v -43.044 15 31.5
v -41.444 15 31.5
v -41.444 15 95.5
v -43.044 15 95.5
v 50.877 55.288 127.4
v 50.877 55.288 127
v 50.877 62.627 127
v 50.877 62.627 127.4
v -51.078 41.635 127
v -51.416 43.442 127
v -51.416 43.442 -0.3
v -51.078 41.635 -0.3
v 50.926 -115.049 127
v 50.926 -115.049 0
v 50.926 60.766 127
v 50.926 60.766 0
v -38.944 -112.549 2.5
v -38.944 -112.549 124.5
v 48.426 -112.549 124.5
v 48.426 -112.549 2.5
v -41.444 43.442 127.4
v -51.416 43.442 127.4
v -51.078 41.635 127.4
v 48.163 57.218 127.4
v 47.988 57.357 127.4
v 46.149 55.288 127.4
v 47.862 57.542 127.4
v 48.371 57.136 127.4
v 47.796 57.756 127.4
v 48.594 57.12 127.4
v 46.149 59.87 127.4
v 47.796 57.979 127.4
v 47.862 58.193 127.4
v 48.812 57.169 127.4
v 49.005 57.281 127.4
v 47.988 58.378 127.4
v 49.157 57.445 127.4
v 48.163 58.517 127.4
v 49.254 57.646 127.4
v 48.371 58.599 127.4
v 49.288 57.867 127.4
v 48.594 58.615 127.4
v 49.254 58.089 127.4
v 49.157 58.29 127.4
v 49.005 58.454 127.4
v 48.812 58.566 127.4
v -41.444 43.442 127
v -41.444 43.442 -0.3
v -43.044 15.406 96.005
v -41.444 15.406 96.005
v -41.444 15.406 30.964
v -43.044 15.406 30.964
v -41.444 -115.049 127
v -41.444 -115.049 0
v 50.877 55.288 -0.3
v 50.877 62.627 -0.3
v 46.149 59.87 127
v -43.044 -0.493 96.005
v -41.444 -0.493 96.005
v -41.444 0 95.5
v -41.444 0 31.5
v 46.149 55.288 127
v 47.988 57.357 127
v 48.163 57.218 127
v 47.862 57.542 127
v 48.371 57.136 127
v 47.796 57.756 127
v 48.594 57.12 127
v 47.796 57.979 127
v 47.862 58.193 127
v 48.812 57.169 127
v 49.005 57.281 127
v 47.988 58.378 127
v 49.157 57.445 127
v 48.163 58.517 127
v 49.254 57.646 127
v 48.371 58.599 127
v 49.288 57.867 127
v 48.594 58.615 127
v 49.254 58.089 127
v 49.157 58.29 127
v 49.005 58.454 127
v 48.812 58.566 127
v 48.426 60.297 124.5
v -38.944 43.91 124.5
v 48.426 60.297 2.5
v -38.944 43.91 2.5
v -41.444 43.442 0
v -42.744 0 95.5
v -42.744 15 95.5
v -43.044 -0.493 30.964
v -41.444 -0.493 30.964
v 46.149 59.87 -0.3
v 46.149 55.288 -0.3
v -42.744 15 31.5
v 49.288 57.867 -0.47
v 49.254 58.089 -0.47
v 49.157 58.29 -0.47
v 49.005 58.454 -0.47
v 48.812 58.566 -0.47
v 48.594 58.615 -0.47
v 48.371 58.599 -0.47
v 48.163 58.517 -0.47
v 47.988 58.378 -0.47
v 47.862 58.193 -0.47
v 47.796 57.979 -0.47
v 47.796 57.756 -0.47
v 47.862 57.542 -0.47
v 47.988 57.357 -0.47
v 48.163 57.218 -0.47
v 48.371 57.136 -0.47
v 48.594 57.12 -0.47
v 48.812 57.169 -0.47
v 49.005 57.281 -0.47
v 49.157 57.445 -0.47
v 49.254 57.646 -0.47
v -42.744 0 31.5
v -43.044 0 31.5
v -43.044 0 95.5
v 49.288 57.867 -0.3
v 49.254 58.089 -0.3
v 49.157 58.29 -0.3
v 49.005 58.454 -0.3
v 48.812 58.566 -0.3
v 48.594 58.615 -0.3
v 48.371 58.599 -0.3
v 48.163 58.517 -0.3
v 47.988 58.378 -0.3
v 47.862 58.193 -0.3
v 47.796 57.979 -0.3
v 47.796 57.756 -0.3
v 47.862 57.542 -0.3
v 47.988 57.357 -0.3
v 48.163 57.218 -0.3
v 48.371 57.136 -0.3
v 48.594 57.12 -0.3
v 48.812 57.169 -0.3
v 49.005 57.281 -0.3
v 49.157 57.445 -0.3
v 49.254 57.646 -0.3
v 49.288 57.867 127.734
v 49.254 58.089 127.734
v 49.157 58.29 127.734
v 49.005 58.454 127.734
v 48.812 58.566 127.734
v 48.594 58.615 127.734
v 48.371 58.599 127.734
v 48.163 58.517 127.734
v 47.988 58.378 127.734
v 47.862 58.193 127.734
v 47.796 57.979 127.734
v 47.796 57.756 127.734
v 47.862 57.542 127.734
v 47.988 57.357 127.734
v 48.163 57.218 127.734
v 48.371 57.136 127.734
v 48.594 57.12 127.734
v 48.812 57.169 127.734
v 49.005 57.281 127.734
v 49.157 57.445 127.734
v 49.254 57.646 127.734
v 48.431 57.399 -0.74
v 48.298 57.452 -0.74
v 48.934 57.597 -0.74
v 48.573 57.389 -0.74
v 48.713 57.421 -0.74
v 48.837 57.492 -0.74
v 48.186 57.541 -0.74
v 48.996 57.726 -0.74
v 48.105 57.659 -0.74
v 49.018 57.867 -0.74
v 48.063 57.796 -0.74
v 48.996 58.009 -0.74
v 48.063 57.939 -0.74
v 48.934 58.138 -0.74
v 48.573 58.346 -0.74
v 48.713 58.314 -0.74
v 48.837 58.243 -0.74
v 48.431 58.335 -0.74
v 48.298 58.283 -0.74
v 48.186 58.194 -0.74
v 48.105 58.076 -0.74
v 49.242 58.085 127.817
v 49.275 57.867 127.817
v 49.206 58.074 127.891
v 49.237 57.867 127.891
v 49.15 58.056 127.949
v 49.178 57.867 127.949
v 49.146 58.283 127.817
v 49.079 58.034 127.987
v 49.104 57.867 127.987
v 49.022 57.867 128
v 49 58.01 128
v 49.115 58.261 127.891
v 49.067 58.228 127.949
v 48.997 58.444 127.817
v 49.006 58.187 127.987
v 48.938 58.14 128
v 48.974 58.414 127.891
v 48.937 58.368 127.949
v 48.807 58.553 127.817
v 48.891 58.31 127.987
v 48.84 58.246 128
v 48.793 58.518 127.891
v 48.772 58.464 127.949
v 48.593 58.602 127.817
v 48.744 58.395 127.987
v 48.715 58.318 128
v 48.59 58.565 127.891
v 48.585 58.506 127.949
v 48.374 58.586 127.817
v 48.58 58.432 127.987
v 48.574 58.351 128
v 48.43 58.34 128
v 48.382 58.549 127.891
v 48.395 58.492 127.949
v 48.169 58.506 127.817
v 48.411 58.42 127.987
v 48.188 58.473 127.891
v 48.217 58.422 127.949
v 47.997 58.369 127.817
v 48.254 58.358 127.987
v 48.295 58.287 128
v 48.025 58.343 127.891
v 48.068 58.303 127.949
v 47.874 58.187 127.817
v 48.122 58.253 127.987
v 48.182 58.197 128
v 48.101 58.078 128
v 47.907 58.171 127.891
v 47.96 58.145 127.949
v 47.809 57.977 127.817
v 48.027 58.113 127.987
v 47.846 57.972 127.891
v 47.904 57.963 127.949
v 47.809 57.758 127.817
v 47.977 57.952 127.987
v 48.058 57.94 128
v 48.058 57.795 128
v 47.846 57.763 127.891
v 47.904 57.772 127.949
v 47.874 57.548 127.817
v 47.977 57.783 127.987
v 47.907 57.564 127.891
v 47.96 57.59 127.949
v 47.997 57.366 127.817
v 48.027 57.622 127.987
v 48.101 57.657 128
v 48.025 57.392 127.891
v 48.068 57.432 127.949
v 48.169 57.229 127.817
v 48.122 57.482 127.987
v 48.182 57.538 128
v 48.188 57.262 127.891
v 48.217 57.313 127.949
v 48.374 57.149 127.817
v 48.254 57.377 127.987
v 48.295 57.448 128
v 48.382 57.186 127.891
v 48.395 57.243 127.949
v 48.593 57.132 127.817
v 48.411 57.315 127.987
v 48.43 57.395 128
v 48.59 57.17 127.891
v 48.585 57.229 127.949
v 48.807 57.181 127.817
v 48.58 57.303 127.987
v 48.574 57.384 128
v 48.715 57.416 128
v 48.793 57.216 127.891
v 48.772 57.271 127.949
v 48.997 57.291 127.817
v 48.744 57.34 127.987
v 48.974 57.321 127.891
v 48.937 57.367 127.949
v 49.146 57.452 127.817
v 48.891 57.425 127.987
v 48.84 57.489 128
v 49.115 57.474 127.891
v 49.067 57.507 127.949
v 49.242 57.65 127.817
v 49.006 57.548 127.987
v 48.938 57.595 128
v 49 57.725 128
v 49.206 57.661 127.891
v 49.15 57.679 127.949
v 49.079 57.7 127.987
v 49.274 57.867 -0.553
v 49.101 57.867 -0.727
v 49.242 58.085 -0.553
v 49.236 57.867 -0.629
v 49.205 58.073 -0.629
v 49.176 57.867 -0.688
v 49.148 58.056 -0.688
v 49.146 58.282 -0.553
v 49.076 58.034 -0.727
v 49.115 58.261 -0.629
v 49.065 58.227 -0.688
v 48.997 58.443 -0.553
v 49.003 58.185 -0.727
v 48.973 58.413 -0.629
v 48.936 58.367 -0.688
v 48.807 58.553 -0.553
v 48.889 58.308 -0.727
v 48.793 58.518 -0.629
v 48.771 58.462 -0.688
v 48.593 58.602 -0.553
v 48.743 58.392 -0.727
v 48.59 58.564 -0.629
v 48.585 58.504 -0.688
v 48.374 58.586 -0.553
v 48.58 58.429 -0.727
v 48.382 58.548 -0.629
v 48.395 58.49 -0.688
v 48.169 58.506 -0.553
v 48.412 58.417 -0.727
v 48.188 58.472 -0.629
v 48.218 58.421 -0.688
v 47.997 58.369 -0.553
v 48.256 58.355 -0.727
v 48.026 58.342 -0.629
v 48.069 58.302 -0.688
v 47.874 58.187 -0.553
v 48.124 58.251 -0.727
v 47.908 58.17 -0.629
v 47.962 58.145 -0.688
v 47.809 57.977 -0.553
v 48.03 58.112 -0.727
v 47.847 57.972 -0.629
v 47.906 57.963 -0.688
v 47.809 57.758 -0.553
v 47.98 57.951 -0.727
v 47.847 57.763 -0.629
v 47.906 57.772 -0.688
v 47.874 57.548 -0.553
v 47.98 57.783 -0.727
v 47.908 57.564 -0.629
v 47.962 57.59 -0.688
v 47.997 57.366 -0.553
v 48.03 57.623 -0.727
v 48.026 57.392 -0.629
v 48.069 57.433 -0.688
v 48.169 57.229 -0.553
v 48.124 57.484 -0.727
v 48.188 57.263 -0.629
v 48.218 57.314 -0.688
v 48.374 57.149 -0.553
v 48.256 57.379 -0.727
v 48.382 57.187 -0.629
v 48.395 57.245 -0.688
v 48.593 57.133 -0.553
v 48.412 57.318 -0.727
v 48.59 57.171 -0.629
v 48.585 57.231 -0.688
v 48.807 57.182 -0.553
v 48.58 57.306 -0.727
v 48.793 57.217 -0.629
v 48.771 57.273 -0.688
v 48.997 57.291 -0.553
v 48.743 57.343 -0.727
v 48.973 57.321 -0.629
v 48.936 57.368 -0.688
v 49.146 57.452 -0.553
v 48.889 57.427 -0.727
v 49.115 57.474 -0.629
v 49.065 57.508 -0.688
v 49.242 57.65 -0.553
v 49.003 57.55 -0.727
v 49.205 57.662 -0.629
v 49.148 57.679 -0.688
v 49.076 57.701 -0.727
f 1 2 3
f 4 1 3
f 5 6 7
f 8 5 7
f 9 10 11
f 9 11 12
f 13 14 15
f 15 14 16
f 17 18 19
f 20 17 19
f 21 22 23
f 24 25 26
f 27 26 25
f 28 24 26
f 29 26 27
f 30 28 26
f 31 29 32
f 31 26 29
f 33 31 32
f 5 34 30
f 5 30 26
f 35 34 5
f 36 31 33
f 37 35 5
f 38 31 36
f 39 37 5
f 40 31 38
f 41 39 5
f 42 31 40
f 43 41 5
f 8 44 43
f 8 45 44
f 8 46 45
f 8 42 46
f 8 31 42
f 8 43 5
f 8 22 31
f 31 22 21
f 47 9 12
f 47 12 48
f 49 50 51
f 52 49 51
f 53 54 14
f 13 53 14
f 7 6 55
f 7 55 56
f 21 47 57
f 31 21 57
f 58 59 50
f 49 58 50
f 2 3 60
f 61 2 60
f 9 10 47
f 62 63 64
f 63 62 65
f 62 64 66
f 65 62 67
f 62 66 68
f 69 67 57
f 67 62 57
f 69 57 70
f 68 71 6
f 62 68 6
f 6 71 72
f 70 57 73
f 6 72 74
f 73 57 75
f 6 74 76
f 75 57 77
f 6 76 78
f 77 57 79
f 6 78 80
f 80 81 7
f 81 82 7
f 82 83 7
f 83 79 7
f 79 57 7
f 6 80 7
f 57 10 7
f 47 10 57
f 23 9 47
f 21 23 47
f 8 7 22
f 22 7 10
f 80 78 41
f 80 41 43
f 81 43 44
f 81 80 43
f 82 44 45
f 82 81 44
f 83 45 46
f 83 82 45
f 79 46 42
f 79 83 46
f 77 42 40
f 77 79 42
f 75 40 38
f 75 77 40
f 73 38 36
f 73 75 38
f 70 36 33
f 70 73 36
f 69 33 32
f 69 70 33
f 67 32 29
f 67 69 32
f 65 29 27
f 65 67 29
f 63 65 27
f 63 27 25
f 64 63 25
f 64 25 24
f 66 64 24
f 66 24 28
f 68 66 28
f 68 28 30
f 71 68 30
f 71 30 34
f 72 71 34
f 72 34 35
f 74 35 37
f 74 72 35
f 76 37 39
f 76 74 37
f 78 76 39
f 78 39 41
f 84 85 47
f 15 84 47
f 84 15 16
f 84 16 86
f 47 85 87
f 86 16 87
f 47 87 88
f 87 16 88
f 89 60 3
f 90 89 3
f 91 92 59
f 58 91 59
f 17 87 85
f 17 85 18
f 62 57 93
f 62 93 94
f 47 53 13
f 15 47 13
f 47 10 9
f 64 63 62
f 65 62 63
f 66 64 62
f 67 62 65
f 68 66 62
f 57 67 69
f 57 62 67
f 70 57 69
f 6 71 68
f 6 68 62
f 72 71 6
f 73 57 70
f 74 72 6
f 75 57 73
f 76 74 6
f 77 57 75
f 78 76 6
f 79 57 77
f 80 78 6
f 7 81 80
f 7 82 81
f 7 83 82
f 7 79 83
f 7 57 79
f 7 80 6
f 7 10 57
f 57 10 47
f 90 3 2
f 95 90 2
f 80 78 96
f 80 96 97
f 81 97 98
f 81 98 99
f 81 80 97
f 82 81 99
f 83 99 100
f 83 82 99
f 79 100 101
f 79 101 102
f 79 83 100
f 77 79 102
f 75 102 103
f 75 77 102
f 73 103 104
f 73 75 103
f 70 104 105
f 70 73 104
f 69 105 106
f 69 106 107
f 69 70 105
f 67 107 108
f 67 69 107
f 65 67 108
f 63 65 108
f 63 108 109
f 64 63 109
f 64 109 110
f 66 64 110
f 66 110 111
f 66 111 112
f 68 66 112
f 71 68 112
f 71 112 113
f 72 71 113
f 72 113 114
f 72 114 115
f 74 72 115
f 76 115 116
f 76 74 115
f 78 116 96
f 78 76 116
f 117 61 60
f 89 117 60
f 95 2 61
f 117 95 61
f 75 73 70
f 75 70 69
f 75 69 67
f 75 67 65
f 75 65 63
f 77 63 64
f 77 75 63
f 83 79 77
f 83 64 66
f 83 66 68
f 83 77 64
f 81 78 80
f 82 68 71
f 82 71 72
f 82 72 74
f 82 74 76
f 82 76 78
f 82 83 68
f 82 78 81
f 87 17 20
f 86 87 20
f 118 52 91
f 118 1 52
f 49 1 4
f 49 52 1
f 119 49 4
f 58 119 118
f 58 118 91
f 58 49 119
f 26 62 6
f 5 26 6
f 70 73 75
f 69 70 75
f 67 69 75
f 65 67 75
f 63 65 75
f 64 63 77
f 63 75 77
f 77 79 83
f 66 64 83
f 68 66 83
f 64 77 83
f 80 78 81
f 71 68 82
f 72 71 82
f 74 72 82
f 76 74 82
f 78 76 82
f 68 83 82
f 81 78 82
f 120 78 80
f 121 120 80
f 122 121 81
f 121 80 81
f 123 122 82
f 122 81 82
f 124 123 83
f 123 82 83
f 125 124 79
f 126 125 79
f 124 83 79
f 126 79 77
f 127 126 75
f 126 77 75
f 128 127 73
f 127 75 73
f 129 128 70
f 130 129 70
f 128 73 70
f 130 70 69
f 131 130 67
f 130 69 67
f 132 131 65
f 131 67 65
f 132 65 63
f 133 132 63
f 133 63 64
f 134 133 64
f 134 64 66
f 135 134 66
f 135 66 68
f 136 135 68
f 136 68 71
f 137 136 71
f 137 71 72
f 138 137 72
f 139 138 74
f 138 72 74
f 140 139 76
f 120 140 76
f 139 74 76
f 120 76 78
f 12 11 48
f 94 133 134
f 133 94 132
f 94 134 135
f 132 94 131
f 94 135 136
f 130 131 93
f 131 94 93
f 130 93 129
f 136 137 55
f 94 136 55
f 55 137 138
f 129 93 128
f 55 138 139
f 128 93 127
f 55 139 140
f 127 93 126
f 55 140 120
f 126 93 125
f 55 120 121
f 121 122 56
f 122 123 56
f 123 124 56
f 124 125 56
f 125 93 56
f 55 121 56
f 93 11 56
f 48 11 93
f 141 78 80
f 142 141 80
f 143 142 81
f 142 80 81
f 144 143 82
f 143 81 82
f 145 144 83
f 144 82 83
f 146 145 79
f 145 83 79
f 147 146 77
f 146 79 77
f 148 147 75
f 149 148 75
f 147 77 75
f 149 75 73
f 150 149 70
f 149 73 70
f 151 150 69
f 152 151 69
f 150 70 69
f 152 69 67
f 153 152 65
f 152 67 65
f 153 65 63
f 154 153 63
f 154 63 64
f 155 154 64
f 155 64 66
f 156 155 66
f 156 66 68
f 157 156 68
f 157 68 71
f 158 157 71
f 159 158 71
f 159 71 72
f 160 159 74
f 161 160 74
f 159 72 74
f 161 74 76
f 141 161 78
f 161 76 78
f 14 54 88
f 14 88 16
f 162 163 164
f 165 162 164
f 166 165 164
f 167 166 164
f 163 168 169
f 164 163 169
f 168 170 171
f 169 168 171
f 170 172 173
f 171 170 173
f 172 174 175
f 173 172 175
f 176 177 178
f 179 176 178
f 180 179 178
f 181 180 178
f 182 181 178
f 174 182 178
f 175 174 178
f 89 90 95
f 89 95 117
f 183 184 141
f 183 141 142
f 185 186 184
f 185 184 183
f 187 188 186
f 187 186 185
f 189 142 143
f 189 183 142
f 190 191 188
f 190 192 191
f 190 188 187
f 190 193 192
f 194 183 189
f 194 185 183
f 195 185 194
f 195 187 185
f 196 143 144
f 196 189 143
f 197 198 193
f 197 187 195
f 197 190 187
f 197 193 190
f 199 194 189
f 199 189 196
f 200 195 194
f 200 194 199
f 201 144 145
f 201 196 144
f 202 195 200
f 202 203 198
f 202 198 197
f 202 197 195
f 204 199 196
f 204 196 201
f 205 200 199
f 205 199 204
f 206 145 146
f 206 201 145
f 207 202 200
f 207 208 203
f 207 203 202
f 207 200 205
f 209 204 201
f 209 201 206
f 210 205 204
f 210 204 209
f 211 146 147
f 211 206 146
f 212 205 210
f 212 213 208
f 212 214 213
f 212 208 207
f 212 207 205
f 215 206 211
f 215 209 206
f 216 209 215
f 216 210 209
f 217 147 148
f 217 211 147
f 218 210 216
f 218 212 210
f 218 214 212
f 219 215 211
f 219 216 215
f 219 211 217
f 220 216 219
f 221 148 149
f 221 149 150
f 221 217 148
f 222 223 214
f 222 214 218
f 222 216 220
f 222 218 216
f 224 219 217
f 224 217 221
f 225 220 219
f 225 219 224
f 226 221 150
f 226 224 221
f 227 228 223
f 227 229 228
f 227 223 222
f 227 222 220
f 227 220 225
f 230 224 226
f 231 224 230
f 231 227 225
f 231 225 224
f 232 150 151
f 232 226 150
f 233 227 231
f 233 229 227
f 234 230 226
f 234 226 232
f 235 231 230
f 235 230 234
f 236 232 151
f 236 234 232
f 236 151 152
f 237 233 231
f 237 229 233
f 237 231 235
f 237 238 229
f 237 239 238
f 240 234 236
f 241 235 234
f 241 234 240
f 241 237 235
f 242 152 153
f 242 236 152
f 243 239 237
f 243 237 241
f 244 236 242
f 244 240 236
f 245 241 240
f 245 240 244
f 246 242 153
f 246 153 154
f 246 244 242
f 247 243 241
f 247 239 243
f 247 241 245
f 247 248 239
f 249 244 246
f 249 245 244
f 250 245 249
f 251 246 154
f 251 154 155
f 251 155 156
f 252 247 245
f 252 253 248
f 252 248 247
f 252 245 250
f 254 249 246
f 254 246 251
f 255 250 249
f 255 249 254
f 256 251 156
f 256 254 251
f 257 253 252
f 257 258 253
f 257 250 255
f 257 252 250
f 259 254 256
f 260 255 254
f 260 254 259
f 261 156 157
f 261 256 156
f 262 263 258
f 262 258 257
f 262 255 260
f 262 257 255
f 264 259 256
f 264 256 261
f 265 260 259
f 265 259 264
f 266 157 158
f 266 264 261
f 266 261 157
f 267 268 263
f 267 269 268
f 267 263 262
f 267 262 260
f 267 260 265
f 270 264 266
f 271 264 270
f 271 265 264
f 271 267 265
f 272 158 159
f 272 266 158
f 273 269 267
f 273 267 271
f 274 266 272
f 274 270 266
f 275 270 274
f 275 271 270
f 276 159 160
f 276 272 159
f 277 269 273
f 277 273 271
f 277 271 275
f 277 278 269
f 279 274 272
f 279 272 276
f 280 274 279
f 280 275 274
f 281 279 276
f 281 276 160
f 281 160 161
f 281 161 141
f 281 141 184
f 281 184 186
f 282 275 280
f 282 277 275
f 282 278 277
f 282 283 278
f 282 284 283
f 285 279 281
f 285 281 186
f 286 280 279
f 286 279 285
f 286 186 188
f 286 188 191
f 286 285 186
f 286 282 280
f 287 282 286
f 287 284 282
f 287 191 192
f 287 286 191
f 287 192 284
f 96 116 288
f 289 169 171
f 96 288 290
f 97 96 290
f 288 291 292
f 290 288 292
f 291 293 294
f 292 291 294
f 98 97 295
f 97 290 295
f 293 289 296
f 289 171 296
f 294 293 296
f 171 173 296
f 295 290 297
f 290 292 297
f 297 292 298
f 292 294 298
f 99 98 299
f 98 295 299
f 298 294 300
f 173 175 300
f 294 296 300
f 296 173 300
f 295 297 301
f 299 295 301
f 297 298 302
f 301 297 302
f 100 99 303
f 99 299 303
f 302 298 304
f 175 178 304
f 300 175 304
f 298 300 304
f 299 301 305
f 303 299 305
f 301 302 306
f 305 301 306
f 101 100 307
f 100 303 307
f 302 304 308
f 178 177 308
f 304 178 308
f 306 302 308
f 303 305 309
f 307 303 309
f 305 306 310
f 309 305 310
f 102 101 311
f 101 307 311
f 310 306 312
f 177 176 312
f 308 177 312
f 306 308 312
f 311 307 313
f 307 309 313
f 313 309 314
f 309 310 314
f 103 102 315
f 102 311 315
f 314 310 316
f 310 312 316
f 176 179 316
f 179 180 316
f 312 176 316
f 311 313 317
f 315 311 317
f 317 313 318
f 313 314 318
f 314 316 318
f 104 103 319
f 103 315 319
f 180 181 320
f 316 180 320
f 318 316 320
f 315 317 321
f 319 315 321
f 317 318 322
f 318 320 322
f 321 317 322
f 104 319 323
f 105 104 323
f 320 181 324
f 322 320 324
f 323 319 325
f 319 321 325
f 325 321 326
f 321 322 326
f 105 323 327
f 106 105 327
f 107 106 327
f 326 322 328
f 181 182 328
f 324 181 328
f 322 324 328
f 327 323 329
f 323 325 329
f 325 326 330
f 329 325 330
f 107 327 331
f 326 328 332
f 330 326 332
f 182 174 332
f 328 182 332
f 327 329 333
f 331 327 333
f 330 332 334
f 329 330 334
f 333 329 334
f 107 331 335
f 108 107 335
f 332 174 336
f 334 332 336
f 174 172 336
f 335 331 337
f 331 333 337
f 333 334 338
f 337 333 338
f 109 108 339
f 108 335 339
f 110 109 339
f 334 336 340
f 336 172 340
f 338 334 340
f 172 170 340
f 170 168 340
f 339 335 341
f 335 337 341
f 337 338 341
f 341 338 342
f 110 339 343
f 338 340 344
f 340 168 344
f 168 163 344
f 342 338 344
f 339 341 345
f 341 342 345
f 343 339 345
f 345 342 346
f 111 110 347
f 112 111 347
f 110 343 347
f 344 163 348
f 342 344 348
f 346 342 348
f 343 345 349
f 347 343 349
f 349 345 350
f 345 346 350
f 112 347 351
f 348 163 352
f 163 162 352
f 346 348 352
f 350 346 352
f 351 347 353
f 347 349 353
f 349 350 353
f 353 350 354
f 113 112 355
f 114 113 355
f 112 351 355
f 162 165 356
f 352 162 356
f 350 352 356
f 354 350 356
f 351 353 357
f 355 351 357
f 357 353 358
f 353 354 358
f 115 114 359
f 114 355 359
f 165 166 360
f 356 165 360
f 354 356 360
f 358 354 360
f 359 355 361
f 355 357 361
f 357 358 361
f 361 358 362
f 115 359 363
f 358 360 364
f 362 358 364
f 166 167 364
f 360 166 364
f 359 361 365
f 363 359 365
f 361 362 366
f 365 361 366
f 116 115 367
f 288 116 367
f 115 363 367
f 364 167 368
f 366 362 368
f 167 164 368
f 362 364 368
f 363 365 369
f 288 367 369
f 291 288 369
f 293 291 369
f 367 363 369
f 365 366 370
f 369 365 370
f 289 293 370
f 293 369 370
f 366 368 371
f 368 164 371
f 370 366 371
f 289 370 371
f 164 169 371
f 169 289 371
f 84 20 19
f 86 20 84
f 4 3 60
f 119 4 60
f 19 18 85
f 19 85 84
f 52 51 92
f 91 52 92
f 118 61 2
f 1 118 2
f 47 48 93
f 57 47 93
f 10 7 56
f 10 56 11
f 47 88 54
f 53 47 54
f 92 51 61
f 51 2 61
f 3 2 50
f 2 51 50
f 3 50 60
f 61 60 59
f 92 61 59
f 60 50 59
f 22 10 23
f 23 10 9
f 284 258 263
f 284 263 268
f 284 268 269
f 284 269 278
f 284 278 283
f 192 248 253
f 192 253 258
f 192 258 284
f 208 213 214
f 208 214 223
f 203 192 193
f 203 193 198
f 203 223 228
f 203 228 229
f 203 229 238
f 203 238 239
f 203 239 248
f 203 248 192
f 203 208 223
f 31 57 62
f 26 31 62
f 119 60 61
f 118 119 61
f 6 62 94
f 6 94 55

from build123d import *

# Parameters (mm, degrees)
F1_DEPTH  = 127
F2_T      = -2.5
F3_R      = 0.75
F4_DEPTH  = 127.3
F5_DEPTH  = 0.4
F6_DEPTH  = 1
F7_DEPTH  = 127.74
F8_R      = 0.27
F9_R      = 0.265563
F11_DEPTH = 1.3
F12_DEPTH = 1.6


with BuildPart() as f1:
    # F0 (on Top) → F1 (new body)
    with BuildSketch(Plane.XY):
        Polygon((-41.444429, 43.441544), (-41.444429, -115.048564), (50.926136, -115.048564), (50.926136, 60.766279), align=None)
    extrude(amount=F1_DEPTH)

    # F2
    f2_openings = [f1.faces().sort_by_distance(p)[0] for p in [
        (4.740854, 52.103911, 63.5),
    ]]
    offset(amount=F2_T, openings=f2_openings)


with BuildPart() as f4:
    # F3 (on face) → F4 (new body)
    with BuildSketch(Plane.XY.offset(127)):
        Polygon((50.876804, 60.757026), (46.148901, 59.870276), (46.148901, 55.288203), (50.876804, 55.288203), align=None)
        with Locations((48.537518, 57.867441)):
            Circle(F3_R, mode=Mode.SUBTRACT)
        Polygon((-41.444429, 43.441544), (46.148901, 59.870276), (50.876804, 60.757026), (50.876804, 62.627344), (-51.416432, 43.441544), (-51.077561, 41.634784), align=None)
    extrude(amount=-F4_DEPTH)


with BuildPart() as f5:
    # F3 (on face) → F5 (new body)
    with BuildSketch(Plane.XY.offset(127)):
        Polygon((-41.444429, 43.441544), (46.148901, 59.870276), (50.876804, 60.757026), (50.876804, 62.627344), (-51.416432, 43.441544), (-51.077561, 41.634784), align=None)
        Polygon((50.876804, 60.757026), (46.148901, 59.870276), (46.148901, 55.288203), (50.876804, 55.288203), align=None)
        with Locations((48.537518, 57.867441)):
            Circle(F3_R, mode=Mode.SUBTRACT)
    extrude(amount=F5_DEPTH)


with BuildPart() as f6:
    # F3 (on face) → F6 (new body)
    with BuildSketch(Plane.XY.offset(127)):
        with Locations((48.537518, 57.867441)):
            Circle(F3_R)
    extrude(amount=F6_DEPTH)

    # F9
    f9_edges = [f6.edges().sort_by_distance(p)[0] for p in [
        (47.787518, 57.867441, 128),
    ]]
    fillet(f9_edges, radius=F9_R)


with BuildPart() as f7:
    # F3 (on face) → F7 (new body)
    with BuildSketch(Plane.XY.offset(127)):
        with Locations((48.537518, 57.867441)):
            Circle(F3_R)
    extrude(amount=-F7_DEPTH)

    # F8
    f8_edges = [f7.edges().sort_by_distance(p)[0] for p in [
        (47.787518, 57.867441, -0.74),
    ]]
    fillet(f8_edges, radius=F8_R)


with BuildPart() as f11:
    # F10 (on face) → F11 (new body)
    with BuildSketch(Plane(origin=(-41.444429, 0, 0), x_dir=(0, -1, 0), z_dir=(-1, 0, 0))):
        Polygon((-15, 95.5), (-15, 63.5), (-15, 31.5), (0, 31.5), (0, 95.5), align=None)
    extrude(amount=F11_DEPTH)


with BuildPart() as f12:
    # F10 (on face) → F12 (new body)
    with BuildSketch(Plane(origin=(-41.444429, 0, 0), x_dir=(0, -1, 0), z_dir=(-1, 0, 0))):
        Polygon((-15.406337, 30.964371), (-15, 30.964371), (0.493095, 30.964371), (0.493095, 96.00541), (-15.406337, 96.00541), align=None)
        Polygon((-15, 31.5), (-15, 63.5), (-15, 95.5), (0, 95.5), (0, 31.5), align=None, mode=Mode.SUBTRACT)
    extrude(amount=F12_DEPTH)


solid = Compound([f1.part, f4.part, f5.part, f6.part, f7.part, f11.part, f12.part])
